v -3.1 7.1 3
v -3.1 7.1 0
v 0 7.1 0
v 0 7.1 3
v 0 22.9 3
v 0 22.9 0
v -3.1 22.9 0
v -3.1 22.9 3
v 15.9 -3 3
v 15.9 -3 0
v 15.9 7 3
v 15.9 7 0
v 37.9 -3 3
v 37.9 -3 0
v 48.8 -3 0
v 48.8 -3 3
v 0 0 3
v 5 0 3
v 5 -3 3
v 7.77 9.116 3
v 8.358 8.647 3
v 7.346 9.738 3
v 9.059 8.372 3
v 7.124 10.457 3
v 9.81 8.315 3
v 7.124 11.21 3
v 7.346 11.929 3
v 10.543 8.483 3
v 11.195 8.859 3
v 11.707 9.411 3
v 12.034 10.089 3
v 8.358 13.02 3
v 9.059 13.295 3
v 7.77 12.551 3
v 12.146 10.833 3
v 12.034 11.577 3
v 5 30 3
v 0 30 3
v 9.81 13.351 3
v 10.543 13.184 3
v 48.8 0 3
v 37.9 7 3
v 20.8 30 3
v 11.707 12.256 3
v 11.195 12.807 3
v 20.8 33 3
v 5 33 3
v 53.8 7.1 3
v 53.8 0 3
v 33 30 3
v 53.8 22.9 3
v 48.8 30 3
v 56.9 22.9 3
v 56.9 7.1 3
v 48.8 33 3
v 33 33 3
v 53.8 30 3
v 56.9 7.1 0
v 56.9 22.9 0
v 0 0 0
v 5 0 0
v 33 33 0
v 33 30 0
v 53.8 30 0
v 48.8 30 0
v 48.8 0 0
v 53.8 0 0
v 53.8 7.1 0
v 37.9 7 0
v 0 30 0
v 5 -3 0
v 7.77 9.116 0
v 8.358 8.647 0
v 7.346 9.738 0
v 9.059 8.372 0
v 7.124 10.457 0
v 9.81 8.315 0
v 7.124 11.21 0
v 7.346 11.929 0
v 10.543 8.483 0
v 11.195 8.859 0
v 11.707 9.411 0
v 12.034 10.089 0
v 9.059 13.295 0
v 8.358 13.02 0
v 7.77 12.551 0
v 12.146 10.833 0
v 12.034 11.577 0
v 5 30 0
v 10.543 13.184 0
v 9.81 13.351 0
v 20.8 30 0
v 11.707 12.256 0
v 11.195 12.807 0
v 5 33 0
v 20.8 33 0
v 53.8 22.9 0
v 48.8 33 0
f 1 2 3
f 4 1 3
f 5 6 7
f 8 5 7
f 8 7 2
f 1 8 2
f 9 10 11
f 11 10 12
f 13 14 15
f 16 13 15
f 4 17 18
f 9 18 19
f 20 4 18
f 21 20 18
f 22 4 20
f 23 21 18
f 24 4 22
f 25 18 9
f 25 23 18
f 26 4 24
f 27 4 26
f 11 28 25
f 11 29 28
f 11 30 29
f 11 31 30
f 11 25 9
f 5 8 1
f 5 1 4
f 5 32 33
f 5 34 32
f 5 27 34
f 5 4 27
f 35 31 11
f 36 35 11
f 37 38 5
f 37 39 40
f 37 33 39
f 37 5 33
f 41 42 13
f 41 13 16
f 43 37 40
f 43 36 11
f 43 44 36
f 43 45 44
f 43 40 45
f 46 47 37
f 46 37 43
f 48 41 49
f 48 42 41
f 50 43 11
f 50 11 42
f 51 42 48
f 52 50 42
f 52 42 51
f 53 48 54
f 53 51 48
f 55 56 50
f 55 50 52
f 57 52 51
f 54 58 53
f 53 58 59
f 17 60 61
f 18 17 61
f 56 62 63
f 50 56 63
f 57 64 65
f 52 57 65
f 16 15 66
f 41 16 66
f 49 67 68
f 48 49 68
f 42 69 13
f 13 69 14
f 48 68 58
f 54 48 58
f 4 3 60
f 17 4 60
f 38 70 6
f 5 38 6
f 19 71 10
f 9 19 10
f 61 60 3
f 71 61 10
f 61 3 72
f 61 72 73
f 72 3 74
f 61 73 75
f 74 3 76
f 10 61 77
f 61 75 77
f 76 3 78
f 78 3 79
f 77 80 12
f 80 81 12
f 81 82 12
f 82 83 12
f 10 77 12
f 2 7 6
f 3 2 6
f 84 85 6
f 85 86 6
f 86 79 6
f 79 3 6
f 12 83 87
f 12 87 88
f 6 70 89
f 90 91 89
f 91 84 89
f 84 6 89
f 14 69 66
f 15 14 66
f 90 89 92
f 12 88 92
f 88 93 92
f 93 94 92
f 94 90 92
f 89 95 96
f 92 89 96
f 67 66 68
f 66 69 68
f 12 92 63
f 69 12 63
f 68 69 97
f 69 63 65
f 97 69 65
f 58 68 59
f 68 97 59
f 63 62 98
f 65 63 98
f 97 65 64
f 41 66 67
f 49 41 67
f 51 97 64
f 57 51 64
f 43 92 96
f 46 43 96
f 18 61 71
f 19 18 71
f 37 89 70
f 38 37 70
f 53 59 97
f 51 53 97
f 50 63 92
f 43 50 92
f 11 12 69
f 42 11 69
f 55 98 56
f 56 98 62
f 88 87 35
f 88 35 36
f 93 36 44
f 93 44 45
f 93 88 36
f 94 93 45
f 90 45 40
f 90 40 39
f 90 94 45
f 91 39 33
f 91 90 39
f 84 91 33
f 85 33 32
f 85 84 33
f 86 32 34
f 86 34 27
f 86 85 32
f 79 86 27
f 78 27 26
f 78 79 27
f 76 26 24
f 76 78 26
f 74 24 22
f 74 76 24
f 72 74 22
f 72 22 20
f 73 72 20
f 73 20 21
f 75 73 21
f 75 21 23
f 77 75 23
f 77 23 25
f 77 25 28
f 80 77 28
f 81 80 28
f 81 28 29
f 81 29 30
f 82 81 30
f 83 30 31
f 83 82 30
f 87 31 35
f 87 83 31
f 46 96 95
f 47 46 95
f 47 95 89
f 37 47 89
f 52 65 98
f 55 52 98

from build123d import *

# Parameters (mm, degrees)
SKETCH1_R           = 2.525
BOSS_EXTRUDE1_DEPTH = 3


with BuildPart() as part:
    # Sketch1 → Boss-Extrude1 (new body)
    with BuildSketch(Plane.XY):
        Polygon((5, 30), (0, 30), (0, 22.9), (-3.1, 22.9), (-3.1, 7.1), (0, 7.1), (0, 0), (5, 0), (5, -3), (15.9, -3), (15.9, 7), (37.9, 7), (37.9, -3), (48.8, -3), (48.8, 0), (53.8, 0), (53.8, 7.1), (56.9, 7.1), (56.9, 22.9), (53.8, 22.9), (53.8, 30), (48.8, 30), (48.8, 33), (33, 33), (33, 30), (20.8, 30), (20.8, 33), (5, 33), align=None)
        with Locations((9.620987069, 10.833243053)):
            Circle(SKETCH1_R, mode=Mode.SUBTRACT)
    extrude(amount=BOSS_EXTRUDE1_DEPTH)


solid = part.part
